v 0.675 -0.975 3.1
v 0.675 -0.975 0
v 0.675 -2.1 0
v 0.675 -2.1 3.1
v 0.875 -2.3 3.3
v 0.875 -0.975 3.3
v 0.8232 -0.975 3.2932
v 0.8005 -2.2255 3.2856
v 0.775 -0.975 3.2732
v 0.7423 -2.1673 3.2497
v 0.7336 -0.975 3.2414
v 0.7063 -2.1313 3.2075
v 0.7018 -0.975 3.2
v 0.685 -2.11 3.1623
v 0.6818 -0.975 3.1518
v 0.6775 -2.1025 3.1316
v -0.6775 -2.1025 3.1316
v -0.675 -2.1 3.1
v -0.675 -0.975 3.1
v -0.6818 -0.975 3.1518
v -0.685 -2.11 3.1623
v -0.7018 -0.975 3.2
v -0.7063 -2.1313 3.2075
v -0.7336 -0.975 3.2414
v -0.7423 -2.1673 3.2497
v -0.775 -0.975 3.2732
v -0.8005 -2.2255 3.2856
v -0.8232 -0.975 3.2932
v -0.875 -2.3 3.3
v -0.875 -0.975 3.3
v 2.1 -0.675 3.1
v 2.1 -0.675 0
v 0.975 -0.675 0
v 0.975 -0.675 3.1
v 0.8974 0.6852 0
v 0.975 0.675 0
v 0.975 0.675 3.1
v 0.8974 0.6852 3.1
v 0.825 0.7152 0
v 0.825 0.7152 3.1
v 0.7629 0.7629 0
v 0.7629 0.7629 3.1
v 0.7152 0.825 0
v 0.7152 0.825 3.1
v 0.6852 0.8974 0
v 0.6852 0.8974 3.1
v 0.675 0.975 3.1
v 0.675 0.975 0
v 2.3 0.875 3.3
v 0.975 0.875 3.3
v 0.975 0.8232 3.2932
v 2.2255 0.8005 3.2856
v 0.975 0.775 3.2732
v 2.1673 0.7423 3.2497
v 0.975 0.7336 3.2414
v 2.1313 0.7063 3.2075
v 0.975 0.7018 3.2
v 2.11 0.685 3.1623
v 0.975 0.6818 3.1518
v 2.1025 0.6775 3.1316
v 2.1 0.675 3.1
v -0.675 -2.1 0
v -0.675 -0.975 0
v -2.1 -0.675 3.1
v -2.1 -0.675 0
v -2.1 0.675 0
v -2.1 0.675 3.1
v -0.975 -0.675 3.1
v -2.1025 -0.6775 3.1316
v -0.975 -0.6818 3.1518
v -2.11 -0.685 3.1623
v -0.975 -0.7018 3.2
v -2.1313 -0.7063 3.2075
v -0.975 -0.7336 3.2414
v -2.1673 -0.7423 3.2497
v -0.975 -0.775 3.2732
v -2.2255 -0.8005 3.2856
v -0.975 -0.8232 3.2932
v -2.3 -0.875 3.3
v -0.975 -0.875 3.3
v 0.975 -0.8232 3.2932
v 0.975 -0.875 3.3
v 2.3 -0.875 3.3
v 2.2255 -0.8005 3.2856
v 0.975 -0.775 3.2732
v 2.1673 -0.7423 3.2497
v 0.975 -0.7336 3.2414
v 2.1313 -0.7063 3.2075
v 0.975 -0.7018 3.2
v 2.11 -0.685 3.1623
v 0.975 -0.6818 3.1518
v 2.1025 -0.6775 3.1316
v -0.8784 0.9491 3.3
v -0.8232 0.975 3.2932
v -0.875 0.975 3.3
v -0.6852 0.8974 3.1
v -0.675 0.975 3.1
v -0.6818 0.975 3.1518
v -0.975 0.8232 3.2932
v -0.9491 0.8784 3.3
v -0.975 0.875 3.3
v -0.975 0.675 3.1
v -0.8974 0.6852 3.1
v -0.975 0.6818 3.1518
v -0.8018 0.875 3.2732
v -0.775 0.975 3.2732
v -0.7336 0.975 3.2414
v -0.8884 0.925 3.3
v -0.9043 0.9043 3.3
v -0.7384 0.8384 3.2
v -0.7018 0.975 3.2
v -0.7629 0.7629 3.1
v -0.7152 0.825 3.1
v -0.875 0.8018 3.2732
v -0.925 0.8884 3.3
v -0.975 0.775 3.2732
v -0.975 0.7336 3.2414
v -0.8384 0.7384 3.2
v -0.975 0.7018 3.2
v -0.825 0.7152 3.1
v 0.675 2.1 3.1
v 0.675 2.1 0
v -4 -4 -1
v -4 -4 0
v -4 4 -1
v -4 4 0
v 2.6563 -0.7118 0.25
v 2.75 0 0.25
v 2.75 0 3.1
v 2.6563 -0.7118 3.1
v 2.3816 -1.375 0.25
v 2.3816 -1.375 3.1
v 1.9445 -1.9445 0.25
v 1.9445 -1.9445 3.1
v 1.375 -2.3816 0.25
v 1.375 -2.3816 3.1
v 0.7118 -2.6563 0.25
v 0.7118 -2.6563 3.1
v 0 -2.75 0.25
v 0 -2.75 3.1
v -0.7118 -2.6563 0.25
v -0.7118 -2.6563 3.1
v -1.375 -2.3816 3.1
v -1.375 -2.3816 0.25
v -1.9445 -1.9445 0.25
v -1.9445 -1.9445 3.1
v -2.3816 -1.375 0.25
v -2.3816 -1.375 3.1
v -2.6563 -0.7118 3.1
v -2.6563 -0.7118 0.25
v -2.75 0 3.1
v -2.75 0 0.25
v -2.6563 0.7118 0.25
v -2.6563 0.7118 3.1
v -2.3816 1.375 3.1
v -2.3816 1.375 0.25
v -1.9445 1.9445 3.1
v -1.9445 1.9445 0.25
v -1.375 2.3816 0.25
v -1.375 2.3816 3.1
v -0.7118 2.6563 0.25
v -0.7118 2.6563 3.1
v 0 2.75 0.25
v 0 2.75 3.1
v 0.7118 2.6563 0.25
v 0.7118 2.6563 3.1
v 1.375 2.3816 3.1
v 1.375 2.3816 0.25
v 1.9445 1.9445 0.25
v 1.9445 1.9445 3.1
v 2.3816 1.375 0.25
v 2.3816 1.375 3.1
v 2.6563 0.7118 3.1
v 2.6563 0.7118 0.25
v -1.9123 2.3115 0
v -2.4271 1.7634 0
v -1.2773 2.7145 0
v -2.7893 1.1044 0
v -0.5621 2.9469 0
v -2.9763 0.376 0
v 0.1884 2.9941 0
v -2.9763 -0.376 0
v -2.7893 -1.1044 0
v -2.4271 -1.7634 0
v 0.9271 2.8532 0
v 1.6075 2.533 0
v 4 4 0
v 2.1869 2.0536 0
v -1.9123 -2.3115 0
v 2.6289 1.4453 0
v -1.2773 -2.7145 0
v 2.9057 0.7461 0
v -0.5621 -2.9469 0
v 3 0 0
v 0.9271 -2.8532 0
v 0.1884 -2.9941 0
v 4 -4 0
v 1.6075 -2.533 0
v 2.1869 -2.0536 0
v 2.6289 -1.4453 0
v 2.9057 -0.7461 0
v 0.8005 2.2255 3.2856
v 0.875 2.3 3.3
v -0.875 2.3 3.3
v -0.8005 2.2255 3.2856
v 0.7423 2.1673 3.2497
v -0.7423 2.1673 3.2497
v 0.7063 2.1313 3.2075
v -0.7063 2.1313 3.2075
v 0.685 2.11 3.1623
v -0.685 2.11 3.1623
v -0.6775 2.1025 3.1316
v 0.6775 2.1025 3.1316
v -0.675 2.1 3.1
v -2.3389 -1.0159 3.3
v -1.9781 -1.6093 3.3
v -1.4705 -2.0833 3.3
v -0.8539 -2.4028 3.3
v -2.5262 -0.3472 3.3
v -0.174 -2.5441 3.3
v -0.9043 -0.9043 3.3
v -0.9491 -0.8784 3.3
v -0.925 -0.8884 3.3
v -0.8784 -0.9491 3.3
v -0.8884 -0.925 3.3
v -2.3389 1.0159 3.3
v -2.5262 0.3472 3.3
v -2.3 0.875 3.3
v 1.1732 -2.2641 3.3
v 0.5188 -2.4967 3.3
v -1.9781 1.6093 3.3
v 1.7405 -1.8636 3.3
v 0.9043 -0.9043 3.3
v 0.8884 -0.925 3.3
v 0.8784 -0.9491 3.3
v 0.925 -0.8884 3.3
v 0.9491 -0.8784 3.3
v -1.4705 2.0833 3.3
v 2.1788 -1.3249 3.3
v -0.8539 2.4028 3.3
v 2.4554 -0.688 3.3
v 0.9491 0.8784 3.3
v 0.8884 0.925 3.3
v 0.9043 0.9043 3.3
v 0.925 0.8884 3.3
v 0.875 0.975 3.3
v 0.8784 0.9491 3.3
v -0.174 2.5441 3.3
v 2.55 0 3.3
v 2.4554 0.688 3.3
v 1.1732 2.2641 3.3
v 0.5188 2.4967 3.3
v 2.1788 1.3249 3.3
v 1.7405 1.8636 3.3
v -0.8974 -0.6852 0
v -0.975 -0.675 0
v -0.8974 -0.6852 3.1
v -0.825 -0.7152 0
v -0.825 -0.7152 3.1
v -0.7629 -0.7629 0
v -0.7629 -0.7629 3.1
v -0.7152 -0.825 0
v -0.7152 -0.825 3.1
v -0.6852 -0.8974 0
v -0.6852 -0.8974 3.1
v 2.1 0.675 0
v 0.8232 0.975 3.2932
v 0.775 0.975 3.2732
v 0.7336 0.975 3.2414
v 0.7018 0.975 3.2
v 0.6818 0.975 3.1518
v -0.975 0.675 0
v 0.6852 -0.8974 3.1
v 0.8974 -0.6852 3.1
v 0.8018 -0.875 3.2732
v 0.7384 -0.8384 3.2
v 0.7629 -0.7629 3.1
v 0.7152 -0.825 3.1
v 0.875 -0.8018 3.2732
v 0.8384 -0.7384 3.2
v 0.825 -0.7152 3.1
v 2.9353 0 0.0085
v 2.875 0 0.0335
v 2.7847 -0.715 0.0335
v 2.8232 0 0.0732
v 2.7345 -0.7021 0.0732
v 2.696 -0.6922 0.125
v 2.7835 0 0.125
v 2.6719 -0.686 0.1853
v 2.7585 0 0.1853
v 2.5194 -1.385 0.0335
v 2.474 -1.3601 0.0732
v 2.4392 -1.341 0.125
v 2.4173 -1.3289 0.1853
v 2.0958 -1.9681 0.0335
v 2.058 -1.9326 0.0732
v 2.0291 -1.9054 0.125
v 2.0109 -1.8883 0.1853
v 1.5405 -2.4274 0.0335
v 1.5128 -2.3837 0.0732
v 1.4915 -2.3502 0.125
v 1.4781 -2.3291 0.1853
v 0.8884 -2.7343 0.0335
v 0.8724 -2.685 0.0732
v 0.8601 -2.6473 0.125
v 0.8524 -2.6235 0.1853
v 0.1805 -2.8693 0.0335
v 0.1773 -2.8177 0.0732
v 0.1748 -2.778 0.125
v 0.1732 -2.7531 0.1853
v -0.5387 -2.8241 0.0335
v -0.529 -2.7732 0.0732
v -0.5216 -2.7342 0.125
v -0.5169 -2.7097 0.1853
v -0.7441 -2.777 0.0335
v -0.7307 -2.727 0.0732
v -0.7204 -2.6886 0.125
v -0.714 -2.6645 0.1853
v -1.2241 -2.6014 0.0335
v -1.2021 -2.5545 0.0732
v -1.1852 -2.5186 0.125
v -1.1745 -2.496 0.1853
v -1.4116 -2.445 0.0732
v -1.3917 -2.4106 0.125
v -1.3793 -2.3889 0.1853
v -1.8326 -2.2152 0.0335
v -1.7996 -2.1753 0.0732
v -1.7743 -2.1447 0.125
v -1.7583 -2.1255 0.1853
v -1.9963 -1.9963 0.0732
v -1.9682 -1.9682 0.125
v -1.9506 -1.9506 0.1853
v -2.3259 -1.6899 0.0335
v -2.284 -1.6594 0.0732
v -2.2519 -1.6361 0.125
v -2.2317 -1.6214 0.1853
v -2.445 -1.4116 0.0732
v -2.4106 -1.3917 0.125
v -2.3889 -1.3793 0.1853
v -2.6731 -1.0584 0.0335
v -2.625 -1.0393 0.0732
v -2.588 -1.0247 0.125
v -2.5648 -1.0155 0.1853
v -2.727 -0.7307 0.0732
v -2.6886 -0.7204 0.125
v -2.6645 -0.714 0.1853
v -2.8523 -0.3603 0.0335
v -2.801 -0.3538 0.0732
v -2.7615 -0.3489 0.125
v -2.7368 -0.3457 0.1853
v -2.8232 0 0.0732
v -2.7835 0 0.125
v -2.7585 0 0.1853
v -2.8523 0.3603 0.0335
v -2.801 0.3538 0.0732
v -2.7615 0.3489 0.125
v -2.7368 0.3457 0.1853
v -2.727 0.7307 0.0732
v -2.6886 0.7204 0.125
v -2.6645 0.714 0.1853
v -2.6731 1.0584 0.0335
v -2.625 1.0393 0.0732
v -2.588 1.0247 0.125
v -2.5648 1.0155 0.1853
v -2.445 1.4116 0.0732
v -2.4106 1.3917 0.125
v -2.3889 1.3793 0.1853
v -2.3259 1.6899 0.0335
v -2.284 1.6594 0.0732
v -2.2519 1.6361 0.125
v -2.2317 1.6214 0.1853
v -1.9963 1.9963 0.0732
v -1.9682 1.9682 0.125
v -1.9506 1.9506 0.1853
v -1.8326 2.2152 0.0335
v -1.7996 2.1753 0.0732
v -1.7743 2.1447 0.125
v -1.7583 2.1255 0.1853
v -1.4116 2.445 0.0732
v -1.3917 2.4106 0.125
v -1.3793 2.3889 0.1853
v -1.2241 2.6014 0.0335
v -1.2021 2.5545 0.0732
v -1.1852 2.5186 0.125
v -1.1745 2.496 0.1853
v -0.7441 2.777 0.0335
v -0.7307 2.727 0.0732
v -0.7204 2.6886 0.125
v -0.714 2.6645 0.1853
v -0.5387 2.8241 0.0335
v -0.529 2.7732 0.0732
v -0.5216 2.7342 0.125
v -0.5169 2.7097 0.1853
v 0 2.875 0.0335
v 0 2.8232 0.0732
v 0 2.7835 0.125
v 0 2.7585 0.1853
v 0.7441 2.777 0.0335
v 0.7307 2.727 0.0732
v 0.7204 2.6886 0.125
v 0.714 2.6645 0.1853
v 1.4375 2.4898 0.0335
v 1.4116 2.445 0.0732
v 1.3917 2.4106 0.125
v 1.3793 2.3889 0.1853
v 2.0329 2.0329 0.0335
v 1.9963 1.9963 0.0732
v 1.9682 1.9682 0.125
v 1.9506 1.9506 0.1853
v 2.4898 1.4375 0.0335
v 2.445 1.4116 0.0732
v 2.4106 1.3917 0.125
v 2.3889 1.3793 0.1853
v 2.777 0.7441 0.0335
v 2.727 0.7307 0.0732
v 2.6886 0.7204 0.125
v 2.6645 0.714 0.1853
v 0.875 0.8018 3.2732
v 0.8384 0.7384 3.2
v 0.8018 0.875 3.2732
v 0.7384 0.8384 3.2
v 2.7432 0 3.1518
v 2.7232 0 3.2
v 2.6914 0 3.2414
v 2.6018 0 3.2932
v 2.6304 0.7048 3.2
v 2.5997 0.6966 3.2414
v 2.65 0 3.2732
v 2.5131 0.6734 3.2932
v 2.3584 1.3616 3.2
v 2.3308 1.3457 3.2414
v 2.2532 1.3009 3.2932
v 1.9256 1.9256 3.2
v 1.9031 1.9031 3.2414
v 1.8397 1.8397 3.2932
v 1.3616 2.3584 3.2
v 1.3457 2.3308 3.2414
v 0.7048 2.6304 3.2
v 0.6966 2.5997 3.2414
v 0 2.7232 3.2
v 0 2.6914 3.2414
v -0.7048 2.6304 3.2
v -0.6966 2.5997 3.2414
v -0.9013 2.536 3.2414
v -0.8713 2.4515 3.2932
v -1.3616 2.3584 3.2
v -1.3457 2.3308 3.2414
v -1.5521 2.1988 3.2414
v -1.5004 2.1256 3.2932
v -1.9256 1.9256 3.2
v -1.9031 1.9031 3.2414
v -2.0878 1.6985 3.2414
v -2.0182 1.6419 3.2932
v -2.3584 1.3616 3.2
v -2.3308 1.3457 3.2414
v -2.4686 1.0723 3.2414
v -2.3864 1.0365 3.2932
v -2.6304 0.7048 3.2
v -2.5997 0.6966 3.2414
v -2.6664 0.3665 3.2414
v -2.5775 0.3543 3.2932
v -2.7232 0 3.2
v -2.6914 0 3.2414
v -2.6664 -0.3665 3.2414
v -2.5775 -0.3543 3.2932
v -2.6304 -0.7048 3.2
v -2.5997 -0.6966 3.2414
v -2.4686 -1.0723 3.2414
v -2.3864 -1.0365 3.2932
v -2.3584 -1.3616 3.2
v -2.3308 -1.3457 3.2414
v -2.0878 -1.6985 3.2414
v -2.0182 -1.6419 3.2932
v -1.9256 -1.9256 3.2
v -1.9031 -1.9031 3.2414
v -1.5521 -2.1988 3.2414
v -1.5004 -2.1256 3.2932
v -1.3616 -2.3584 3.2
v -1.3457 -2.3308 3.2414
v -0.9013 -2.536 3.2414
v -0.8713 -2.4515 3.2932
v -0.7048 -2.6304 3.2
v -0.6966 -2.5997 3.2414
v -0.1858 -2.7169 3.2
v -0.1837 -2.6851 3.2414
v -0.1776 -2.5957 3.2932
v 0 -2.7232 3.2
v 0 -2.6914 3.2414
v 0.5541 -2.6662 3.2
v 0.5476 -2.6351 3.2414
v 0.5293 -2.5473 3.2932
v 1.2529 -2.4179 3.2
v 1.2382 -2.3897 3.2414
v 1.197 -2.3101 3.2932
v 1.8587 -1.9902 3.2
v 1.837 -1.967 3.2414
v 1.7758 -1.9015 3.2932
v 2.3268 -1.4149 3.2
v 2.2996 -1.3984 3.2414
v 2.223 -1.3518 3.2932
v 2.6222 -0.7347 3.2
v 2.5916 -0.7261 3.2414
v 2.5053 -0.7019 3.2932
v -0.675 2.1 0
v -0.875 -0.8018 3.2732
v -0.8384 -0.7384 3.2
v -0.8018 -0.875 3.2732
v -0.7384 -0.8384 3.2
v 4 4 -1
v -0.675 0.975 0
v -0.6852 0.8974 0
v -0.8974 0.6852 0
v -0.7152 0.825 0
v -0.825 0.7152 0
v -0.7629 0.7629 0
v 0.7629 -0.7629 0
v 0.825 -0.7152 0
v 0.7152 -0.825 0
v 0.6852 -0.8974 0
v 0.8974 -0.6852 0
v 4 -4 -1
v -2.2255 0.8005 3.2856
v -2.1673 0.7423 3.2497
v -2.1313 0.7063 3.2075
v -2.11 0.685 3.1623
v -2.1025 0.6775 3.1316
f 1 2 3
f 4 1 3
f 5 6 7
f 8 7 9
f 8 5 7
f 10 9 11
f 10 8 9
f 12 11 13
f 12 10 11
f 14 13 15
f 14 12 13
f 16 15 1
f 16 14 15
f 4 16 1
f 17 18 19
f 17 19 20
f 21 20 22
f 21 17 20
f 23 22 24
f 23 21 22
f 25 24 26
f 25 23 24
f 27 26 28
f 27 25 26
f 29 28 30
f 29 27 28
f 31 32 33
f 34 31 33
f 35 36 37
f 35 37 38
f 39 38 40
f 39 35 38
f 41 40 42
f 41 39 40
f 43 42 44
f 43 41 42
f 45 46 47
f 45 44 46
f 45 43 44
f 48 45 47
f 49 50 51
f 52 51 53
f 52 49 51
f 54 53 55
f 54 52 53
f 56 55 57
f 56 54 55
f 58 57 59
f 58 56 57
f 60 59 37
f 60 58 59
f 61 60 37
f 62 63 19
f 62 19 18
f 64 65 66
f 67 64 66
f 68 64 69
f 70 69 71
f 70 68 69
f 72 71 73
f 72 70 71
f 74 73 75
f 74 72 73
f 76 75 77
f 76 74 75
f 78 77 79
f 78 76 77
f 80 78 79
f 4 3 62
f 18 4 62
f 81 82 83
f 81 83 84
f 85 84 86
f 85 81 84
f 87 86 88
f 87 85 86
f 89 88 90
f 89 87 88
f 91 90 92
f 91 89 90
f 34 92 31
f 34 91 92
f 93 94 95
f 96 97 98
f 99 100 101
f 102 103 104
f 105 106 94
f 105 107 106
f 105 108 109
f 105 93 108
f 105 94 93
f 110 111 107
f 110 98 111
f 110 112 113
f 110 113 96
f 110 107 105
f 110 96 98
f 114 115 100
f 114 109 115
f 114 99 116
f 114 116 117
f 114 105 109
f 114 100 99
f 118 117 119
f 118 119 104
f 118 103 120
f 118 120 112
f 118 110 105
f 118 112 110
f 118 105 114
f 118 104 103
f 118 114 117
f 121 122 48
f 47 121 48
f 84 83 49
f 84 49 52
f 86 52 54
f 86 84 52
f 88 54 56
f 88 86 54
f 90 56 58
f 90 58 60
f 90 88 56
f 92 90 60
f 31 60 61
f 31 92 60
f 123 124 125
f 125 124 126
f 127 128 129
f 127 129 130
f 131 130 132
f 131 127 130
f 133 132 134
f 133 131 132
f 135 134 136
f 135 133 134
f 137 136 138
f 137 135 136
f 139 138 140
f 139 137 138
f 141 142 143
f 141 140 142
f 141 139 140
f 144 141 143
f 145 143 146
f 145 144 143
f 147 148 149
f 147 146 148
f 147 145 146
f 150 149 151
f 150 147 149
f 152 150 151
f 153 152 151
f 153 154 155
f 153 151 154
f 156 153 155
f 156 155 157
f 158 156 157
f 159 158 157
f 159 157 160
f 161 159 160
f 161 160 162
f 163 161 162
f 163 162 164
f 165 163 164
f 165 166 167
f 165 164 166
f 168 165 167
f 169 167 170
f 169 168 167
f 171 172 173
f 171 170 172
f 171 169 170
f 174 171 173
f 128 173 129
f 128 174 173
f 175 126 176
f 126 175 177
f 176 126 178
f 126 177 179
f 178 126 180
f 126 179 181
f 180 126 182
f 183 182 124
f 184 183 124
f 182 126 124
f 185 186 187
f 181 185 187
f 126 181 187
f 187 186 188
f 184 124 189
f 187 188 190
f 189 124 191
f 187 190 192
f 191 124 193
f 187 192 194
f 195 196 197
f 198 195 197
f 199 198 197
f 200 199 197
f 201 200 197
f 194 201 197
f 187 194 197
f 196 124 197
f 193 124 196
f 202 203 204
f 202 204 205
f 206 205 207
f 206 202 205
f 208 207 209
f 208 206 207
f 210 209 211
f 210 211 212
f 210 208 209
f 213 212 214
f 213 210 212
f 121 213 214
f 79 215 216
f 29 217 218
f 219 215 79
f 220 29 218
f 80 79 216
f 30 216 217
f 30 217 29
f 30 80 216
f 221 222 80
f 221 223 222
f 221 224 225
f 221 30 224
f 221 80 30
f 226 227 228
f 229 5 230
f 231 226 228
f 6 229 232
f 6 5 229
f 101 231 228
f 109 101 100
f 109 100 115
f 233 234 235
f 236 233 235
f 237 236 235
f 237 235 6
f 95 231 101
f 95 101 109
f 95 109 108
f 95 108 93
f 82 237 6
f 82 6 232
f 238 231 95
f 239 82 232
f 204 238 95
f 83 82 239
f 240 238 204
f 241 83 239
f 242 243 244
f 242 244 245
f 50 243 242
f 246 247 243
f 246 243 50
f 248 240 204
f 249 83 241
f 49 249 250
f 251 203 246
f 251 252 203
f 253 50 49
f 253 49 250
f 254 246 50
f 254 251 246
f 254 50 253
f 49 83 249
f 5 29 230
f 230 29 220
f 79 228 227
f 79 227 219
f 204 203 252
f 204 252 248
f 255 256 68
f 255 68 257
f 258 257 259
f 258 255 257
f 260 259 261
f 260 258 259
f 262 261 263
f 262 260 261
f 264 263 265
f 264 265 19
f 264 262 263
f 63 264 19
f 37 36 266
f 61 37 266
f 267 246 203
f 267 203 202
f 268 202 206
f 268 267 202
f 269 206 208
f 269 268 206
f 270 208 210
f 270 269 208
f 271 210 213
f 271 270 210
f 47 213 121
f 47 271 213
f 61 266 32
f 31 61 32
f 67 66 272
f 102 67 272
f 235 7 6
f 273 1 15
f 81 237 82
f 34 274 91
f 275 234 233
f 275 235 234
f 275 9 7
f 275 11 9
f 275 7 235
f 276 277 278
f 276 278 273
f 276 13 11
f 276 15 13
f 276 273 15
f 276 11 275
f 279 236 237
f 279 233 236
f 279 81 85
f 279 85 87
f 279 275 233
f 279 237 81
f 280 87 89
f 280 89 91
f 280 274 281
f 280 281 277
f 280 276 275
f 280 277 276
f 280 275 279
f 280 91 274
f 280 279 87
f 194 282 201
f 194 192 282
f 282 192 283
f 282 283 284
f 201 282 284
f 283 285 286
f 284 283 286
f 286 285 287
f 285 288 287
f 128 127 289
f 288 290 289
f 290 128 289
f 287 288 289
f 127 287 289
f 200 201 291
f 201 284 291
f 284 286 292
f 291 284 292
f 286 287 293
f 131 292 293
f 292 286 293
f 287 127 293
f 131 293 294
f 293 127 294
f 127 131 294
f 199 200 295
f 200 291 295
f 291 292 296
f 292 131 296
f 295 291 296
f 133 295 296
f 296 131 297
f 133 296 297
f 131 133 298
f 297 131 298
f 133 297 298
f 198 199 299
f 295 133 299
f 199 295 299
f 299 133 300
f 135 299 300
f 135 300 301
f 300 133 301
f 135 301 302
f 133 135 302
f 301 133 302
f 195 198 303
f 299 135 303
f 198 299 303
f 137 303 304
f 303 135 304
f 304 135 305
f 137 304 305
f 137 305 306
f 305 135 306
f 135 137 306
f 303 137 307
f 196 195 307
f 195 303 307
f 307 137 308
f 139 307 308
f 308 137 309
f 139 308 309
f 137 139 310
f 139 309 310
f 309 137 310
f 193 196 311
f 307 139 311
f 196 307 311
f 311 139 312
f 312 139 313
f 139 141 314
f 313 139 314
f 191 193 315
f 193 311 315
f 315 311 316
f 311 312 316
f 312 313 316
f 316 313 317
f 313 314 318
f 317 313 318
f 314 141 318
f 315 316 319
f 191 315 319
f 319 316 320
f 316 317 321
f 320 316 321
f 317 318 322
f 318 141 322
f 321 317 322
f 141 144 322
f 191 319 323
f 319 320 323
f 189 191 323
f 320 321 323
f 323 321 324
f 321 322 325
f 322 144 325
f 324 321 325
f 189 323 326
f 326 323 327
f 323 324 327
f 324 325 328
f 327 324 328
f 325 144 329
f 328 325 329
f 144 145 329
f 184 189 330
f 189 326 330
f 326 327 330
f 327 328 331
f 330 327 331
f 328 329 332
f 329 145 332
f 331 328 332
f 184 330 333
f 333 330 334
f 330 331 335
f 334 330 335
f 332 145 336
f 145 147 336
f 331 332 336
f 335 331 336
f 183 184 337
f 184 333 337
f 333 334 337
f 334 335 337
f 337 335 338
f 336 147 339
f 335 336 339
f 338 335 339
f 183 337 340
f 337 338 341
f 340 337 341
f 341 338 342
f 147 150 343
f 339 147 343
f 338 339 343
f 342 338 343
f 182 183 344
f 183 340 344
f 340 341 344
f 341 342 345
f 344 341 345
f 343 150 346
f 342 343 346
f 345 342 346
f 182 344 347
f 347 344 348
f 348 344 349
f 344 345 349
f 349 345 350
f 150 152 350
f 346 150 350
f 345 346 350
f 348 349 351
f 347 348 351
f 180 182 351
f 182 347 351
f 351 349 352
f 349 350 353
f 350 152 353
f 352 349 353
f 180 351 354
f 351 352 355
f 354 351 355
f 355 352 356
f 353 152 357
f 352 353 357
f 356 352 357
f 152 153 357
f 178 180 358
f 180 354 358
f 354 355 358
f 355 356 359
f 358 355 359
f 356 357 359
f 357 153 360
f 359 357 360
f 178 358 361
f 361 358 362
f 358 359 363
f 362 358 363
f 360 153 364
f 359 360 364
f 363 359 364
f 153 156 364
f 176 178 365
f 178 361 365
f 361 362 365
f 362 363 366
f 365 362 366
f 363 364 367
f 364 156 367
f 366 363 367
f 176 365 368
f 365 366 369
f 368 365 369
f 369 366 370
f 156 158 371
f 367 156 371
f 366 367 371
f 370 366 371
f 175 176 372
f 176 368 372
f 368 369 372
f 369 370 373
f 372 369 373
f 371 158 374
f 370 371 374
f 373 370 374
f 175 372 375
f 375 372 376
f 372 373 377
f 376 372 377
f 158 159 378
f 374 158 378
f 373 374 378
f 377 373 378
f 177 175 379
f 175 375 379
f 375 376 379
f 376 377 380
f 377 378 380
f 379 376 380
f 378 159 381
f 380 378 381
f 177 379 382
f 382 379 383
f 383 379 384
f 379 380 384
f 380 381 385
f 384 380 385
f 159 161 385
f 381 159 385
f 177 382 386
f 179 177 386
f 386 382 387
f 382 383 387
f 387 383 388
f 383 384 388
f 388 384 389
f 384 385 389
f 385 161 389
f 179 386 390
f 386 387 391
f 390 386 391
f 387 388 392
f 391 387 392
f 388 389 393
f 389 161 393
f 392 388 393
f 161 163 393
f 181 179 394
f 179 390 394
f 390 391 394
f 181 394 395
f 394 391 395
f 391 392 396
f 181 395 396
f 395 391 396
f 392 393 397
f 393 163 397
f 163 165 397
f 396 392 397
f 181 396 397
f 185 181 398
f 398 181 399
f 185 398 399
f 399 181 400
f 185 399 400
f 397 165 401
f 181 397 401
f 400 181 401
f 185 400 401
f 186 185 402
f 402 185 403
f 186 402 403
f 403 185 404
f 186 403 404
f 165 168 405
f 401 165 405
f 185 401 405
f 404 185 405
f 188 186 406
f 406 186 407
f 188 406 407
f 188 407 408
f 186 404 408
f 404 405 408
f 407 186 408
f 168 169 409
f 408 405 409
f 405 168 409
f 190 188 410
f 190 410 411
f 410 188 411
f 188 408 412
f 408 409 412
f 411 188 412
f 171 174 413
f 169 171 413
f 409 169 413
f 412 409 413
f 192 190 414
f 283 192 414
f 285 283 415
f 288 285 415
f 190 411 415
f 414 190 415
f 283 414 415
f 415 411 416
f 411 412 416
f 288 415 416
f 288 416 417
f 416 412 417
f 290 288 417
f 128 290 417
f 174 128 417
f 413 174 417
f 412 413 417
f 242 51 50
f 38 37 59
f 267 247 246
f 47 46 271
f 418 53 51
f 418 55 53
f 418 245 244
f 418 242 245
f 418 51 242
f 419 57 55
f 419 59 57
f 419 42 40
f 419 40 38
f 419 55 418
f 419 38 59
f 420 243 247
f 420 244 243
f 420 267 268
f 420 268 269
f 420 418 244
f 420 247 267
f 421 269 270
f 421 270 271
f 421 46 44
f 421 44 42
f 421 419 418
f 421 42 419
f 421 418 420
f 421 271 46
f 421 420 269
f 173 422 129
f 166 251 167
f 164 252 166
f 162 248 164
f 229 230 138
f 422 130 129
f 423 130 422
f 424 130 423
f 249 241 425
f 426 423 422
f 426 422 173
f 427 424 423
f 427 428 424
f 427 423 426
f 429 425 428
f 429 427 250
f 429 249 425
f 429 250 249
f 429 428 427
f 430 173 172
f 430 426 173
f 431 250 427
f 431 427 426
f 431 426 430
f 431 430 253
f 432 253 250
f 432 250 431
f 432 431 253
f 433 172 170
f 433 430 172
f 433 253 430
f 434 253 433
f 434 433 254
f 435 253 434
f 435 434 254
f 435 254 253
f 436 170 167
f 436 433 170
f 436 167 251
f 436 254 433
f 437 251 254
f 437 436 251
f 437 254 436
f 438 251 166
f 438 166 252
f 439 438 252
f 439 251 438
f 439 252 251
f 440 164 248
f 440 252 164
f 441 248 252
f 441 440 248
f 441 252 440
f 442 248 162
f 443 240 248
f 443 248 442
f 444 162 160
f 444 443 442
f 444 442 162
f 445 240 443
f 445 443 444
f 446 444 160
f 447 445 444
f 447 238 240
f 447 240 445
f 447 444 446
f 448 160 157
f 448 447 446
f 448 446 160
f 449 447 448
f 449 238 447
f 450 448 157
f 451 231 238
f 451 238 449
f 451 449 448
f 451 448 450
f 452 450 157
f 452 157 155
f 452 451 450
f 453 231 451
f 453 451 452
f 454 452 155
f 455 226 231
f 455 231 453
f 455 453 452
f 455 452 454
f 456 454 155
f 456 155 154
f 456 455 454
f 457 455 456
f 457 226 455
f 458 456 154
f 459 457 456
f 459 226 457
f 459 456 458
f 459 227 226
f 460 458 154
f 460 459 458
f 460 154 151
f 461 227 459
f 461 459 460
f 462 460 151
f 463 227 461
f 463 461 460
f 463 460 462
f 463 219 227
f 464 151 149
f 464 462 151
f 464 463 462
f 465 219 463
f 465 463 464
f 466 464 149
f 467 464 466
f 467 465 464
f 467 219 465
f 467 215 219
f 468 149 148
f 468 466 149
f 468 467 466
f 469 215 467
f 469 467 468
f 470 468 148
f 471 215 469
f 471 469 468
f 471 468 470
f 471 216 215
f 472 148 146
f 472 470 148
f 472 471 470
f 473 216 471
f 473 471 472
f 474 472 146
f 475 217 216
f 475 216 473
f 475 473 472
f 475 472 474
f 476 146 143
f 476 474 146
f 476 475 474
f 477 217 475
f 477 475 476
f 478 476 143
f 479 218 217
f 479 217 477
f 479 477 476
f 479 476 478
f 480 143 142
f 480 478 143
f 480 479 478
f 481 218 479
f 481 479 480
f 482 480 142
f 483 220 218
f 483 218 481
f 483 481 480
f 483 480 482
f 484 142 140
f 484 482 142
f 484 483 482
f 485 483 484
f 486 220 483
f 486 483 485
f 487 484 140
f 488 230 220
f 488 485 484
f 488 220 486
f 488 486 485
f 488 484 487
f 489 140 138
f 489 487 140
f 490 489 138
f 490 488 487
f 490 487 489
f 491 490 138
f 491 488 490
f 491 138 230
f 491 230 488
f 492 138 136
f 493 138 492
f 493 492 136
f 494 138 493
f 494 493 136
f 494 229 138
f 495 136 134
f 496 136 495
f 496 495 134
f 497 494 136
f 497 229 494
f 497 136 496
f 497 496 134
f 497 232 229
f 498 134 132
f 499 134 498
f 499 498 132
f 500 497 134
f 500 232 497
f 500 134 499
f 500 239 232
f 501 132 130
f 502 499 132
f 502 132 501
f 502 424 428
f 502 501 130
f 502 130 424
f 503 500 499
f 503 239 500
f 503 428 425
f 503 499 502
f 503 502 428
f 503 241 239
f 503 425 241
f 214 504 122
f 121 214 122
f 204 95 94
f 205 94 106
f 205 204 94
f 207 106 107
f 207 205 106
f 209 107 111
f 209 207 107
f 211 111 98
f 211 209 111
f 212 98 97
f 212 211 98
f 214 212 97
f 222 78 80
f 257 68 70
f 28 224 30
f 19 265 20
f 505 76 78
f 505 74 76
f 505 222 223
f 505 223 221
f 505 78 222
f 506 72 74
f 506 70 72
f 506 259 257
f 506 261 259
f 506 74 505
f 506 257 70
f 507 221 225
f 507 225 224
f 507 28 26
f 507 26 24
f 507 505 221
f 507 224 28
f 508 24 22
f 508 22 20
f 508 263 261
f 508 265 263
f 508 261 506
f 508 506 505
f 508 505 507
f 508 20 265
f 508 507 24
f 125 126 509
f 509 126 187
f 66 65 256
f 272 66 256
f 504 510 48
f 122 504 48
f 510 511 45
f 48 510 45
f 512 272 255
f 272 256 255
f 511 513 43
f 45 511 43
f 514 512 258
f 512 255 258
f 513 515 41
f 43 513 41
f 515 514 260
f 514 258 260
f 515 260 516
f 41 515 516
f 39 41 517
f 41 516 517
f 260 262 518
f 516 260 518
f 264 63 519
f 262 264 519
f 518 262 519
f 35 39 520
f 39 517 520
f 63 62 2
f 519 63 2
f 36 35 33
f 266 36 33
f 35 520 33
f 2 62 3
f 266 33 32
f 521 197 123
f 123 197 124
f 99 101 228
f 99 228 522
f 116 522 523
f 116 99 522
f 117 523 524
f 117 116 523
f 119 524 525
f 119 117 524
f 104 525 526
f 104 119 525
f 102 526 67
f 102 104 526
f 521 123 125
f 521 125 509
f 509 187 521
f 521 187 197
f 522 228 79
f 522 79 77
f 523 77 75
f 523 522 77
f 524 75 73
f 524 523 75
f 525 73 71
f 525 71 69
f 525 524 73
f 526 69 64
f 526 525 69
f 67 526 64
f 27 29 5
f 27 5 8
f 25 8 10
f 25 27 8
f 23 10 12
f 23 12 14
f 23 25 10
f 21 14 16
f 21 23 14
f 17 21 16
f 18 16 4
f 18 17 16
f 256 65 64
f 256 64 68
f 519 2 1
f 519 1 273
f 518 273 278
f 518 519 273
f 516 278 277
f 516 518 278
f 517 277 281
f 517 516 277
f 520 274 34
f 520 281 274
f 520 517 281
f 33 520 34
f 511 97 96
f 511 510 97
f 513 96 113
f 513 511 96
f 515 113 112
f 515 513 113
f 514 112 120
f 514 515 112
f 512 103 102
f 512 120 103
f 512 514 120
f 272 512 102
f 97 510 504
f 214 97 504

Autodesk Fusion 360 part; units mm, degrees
sketch "Sketch1" plane through (0, 0, 0) normal (0, 0, 1) x (1, 0, 0)
  circle A0 centre (0, 0) radius 2.75
  line L0 (0.675, -2.1) -> (-0.675, -2.1)
  line L1 (-0.675, 0.975) -> (-0.675, 2.1)
  line L2 (-0.675, 2.1) -> (0.675, 2.1)
  line L3 (0.675, -0.975) -> (0.675, -2.1)
  line L4 (0.675, -2.1) -> (-0.675, 2.1) construction
  line L5 (-0.675, -2.1) -> (0.675, 2.1) construction
  line L6 (2.1, -0.675) -> (0.975, -0.675)
  line L7 (-2.1, -0.675) -> (-2.1, 0.675)
  line L8 (0.975, 0.675) -> (2.1, 0.675)
  line L9 (2.1, 0.675) -> (2.1, -0.675)
  line L10 (2.1, -0.675) -> (-2.1, 0.675) construction
  line L11 (-2.1, -0.675) -> (2.1, 0.675) construction
  arc A1 (0.975, -0.675) -> (0.675, -0.975) centre (0.975, -0.975) ccw
  line L12 (0.675, 2.1) -> (0.675, 0.975)
  arc A2 (0.675, 0.975) -> (0.975, 0.675) centre (0.975, 0.975) ccw
  line L13 (-2.1, 0.675) -> (-0.975, 0.675)
  line L14 (-2.1, -0.675) -> (-0.975, -0.675)
  arc A3 (-0.975, 0.675) -> (-0.675, 0.975) centre (-0.975, 0.975) ccw
  line L15 (-0.675, -0.975) -> (-0.675, -2.1)
  arc A4 (-0.675, -0.975) -> (-0.975, -0.675) centre (-0.975, -0.975) ccw
  point P0 (0.675, -0.675)
  dimension "d1" = 5.5
  dimension "d2" = 1.35
  dimension "d3" = 4.2
  dimension "d4" = 4.2
  dimension "d5" = 1.35
  dimension "d6" = 0.3
  dimension "d7" = 0.3
  dimension "d8" = 0.3
  dimension "d9" = 0.3
extrude "Extrude1" add sketch "Sketch1" along normal blind 3.3
sketch "Sketch2" plane through (0, 0, 0) normal (0, 0, -1) x (1, 0, 0)
  line L0 (-2.1, 0.675) -> (-0.975, 0.675)
  arc A0 (-0.975, 0.675) -> (-0.675, 0.975) centre (-0.975, 0.975) ccw
  line L1 (-0.675, 0.975) -> (-0.675, 2.1)
  line L2 (-0.675, 2.1) -> (0.675, 2.1)
  line L3 (0.675, 2.1) -> (0.675, 0.975)
  arc A1 (0.675, 0.975) -> (0.975, 0.675) centre (0.975, 0.975) ccw
  line L4 (0.975, 0.675) -> (2.1, 0.675)
  line L5 (2.1, 0.675) -> (2.1, -0.675)
  line L6 (2.1, -0.675) -> (0.975, -0.675)
  arc A2 (0.975, -0.675) -> (0.675, -0.975) centre (0.975, -0.975) ccw
  line L7 (0.675, -0.975) -> (0.675, -2.1)
  line L8 (0.675, -2.1) -> (-0.675, -2.1)
  line L9 (-0.675, -2.1) -> (-0.675, -0.975)
  arc A3 (-0.675, -0.975) -> (-0.975, -0.675) centre (-0.975, -0.975) ccw
  line L10 (-0.975, -0.675) -> (-2.1, -0.675)
  line L11 (-2.1, -0.675) -> (-2.1, 0.675)
  circle A4 centre (0, 0) radius 2.75
  line L12 (4, 4) -> (-4, 4)
  line L13 (-4, 4) -> (-4, -4)
  line L14 (-4, -4) -> (4, -4)
  line L15 (4, -4) -> (4, 4)
  line L16 (4, 4) -> (-4, -4) construction
  line L17 (-4, 4) -> (4, -4) construction
  dimension "d12" = 8
  dimension "d13" = 8
extrude "Extrude2" add sketch "Sketch2" along normal blind 1 contours L0 A0 L1 L2 L3 A1 L4 L5 L6 A2 L7 L8 L9 A3 L10 L11 | A4 | L12 L13 L14 L15
fillet "Fillet1" radius 0.25 1 edges at (-2.5639, -0.9944, 0)
fillet "Fillet2" radius 0.2 1 edges at (-2.5639, -0.9944, 3.3)
fillet "Fillet3" radius 0.2 16 edges at (1.5375, -0.675, 3.3) (0.7629, -0.7629, 3.3) (0.675, -1.5375, 3.3) (2.1, 0, 3.3) (0.675, 1.5375, 3.3) (0.7629, 0.7629, 3.3) (1.5375, 0.675, 3.3) (0, 2.1, 3.3) (-1.5375, 0.675, 3.3) (-0.7629, 0.7629, 3.3) (-0.675, 1.5375, 3.3) (-2.1, 0, 3.3) (-0.675, -1.5375, 3.3) (-0.7629, -0.7629, 3.3) (-1.5375, -0.675, 3.3) (0, -2.1, 3.3)
equation "d2 = cross_thickness"
equation "d3 = cross_xy"
equation "d4 = cross_xy"
equation "d5 = cross_thickness"
equation "d10 = stem_height"
equation "cross_xy = 4.20 mm"
equation "cross_thickness = 1.35 mm"
equation "stem_height = 3.3 mm" comment "3.45 is the max for lofree"
